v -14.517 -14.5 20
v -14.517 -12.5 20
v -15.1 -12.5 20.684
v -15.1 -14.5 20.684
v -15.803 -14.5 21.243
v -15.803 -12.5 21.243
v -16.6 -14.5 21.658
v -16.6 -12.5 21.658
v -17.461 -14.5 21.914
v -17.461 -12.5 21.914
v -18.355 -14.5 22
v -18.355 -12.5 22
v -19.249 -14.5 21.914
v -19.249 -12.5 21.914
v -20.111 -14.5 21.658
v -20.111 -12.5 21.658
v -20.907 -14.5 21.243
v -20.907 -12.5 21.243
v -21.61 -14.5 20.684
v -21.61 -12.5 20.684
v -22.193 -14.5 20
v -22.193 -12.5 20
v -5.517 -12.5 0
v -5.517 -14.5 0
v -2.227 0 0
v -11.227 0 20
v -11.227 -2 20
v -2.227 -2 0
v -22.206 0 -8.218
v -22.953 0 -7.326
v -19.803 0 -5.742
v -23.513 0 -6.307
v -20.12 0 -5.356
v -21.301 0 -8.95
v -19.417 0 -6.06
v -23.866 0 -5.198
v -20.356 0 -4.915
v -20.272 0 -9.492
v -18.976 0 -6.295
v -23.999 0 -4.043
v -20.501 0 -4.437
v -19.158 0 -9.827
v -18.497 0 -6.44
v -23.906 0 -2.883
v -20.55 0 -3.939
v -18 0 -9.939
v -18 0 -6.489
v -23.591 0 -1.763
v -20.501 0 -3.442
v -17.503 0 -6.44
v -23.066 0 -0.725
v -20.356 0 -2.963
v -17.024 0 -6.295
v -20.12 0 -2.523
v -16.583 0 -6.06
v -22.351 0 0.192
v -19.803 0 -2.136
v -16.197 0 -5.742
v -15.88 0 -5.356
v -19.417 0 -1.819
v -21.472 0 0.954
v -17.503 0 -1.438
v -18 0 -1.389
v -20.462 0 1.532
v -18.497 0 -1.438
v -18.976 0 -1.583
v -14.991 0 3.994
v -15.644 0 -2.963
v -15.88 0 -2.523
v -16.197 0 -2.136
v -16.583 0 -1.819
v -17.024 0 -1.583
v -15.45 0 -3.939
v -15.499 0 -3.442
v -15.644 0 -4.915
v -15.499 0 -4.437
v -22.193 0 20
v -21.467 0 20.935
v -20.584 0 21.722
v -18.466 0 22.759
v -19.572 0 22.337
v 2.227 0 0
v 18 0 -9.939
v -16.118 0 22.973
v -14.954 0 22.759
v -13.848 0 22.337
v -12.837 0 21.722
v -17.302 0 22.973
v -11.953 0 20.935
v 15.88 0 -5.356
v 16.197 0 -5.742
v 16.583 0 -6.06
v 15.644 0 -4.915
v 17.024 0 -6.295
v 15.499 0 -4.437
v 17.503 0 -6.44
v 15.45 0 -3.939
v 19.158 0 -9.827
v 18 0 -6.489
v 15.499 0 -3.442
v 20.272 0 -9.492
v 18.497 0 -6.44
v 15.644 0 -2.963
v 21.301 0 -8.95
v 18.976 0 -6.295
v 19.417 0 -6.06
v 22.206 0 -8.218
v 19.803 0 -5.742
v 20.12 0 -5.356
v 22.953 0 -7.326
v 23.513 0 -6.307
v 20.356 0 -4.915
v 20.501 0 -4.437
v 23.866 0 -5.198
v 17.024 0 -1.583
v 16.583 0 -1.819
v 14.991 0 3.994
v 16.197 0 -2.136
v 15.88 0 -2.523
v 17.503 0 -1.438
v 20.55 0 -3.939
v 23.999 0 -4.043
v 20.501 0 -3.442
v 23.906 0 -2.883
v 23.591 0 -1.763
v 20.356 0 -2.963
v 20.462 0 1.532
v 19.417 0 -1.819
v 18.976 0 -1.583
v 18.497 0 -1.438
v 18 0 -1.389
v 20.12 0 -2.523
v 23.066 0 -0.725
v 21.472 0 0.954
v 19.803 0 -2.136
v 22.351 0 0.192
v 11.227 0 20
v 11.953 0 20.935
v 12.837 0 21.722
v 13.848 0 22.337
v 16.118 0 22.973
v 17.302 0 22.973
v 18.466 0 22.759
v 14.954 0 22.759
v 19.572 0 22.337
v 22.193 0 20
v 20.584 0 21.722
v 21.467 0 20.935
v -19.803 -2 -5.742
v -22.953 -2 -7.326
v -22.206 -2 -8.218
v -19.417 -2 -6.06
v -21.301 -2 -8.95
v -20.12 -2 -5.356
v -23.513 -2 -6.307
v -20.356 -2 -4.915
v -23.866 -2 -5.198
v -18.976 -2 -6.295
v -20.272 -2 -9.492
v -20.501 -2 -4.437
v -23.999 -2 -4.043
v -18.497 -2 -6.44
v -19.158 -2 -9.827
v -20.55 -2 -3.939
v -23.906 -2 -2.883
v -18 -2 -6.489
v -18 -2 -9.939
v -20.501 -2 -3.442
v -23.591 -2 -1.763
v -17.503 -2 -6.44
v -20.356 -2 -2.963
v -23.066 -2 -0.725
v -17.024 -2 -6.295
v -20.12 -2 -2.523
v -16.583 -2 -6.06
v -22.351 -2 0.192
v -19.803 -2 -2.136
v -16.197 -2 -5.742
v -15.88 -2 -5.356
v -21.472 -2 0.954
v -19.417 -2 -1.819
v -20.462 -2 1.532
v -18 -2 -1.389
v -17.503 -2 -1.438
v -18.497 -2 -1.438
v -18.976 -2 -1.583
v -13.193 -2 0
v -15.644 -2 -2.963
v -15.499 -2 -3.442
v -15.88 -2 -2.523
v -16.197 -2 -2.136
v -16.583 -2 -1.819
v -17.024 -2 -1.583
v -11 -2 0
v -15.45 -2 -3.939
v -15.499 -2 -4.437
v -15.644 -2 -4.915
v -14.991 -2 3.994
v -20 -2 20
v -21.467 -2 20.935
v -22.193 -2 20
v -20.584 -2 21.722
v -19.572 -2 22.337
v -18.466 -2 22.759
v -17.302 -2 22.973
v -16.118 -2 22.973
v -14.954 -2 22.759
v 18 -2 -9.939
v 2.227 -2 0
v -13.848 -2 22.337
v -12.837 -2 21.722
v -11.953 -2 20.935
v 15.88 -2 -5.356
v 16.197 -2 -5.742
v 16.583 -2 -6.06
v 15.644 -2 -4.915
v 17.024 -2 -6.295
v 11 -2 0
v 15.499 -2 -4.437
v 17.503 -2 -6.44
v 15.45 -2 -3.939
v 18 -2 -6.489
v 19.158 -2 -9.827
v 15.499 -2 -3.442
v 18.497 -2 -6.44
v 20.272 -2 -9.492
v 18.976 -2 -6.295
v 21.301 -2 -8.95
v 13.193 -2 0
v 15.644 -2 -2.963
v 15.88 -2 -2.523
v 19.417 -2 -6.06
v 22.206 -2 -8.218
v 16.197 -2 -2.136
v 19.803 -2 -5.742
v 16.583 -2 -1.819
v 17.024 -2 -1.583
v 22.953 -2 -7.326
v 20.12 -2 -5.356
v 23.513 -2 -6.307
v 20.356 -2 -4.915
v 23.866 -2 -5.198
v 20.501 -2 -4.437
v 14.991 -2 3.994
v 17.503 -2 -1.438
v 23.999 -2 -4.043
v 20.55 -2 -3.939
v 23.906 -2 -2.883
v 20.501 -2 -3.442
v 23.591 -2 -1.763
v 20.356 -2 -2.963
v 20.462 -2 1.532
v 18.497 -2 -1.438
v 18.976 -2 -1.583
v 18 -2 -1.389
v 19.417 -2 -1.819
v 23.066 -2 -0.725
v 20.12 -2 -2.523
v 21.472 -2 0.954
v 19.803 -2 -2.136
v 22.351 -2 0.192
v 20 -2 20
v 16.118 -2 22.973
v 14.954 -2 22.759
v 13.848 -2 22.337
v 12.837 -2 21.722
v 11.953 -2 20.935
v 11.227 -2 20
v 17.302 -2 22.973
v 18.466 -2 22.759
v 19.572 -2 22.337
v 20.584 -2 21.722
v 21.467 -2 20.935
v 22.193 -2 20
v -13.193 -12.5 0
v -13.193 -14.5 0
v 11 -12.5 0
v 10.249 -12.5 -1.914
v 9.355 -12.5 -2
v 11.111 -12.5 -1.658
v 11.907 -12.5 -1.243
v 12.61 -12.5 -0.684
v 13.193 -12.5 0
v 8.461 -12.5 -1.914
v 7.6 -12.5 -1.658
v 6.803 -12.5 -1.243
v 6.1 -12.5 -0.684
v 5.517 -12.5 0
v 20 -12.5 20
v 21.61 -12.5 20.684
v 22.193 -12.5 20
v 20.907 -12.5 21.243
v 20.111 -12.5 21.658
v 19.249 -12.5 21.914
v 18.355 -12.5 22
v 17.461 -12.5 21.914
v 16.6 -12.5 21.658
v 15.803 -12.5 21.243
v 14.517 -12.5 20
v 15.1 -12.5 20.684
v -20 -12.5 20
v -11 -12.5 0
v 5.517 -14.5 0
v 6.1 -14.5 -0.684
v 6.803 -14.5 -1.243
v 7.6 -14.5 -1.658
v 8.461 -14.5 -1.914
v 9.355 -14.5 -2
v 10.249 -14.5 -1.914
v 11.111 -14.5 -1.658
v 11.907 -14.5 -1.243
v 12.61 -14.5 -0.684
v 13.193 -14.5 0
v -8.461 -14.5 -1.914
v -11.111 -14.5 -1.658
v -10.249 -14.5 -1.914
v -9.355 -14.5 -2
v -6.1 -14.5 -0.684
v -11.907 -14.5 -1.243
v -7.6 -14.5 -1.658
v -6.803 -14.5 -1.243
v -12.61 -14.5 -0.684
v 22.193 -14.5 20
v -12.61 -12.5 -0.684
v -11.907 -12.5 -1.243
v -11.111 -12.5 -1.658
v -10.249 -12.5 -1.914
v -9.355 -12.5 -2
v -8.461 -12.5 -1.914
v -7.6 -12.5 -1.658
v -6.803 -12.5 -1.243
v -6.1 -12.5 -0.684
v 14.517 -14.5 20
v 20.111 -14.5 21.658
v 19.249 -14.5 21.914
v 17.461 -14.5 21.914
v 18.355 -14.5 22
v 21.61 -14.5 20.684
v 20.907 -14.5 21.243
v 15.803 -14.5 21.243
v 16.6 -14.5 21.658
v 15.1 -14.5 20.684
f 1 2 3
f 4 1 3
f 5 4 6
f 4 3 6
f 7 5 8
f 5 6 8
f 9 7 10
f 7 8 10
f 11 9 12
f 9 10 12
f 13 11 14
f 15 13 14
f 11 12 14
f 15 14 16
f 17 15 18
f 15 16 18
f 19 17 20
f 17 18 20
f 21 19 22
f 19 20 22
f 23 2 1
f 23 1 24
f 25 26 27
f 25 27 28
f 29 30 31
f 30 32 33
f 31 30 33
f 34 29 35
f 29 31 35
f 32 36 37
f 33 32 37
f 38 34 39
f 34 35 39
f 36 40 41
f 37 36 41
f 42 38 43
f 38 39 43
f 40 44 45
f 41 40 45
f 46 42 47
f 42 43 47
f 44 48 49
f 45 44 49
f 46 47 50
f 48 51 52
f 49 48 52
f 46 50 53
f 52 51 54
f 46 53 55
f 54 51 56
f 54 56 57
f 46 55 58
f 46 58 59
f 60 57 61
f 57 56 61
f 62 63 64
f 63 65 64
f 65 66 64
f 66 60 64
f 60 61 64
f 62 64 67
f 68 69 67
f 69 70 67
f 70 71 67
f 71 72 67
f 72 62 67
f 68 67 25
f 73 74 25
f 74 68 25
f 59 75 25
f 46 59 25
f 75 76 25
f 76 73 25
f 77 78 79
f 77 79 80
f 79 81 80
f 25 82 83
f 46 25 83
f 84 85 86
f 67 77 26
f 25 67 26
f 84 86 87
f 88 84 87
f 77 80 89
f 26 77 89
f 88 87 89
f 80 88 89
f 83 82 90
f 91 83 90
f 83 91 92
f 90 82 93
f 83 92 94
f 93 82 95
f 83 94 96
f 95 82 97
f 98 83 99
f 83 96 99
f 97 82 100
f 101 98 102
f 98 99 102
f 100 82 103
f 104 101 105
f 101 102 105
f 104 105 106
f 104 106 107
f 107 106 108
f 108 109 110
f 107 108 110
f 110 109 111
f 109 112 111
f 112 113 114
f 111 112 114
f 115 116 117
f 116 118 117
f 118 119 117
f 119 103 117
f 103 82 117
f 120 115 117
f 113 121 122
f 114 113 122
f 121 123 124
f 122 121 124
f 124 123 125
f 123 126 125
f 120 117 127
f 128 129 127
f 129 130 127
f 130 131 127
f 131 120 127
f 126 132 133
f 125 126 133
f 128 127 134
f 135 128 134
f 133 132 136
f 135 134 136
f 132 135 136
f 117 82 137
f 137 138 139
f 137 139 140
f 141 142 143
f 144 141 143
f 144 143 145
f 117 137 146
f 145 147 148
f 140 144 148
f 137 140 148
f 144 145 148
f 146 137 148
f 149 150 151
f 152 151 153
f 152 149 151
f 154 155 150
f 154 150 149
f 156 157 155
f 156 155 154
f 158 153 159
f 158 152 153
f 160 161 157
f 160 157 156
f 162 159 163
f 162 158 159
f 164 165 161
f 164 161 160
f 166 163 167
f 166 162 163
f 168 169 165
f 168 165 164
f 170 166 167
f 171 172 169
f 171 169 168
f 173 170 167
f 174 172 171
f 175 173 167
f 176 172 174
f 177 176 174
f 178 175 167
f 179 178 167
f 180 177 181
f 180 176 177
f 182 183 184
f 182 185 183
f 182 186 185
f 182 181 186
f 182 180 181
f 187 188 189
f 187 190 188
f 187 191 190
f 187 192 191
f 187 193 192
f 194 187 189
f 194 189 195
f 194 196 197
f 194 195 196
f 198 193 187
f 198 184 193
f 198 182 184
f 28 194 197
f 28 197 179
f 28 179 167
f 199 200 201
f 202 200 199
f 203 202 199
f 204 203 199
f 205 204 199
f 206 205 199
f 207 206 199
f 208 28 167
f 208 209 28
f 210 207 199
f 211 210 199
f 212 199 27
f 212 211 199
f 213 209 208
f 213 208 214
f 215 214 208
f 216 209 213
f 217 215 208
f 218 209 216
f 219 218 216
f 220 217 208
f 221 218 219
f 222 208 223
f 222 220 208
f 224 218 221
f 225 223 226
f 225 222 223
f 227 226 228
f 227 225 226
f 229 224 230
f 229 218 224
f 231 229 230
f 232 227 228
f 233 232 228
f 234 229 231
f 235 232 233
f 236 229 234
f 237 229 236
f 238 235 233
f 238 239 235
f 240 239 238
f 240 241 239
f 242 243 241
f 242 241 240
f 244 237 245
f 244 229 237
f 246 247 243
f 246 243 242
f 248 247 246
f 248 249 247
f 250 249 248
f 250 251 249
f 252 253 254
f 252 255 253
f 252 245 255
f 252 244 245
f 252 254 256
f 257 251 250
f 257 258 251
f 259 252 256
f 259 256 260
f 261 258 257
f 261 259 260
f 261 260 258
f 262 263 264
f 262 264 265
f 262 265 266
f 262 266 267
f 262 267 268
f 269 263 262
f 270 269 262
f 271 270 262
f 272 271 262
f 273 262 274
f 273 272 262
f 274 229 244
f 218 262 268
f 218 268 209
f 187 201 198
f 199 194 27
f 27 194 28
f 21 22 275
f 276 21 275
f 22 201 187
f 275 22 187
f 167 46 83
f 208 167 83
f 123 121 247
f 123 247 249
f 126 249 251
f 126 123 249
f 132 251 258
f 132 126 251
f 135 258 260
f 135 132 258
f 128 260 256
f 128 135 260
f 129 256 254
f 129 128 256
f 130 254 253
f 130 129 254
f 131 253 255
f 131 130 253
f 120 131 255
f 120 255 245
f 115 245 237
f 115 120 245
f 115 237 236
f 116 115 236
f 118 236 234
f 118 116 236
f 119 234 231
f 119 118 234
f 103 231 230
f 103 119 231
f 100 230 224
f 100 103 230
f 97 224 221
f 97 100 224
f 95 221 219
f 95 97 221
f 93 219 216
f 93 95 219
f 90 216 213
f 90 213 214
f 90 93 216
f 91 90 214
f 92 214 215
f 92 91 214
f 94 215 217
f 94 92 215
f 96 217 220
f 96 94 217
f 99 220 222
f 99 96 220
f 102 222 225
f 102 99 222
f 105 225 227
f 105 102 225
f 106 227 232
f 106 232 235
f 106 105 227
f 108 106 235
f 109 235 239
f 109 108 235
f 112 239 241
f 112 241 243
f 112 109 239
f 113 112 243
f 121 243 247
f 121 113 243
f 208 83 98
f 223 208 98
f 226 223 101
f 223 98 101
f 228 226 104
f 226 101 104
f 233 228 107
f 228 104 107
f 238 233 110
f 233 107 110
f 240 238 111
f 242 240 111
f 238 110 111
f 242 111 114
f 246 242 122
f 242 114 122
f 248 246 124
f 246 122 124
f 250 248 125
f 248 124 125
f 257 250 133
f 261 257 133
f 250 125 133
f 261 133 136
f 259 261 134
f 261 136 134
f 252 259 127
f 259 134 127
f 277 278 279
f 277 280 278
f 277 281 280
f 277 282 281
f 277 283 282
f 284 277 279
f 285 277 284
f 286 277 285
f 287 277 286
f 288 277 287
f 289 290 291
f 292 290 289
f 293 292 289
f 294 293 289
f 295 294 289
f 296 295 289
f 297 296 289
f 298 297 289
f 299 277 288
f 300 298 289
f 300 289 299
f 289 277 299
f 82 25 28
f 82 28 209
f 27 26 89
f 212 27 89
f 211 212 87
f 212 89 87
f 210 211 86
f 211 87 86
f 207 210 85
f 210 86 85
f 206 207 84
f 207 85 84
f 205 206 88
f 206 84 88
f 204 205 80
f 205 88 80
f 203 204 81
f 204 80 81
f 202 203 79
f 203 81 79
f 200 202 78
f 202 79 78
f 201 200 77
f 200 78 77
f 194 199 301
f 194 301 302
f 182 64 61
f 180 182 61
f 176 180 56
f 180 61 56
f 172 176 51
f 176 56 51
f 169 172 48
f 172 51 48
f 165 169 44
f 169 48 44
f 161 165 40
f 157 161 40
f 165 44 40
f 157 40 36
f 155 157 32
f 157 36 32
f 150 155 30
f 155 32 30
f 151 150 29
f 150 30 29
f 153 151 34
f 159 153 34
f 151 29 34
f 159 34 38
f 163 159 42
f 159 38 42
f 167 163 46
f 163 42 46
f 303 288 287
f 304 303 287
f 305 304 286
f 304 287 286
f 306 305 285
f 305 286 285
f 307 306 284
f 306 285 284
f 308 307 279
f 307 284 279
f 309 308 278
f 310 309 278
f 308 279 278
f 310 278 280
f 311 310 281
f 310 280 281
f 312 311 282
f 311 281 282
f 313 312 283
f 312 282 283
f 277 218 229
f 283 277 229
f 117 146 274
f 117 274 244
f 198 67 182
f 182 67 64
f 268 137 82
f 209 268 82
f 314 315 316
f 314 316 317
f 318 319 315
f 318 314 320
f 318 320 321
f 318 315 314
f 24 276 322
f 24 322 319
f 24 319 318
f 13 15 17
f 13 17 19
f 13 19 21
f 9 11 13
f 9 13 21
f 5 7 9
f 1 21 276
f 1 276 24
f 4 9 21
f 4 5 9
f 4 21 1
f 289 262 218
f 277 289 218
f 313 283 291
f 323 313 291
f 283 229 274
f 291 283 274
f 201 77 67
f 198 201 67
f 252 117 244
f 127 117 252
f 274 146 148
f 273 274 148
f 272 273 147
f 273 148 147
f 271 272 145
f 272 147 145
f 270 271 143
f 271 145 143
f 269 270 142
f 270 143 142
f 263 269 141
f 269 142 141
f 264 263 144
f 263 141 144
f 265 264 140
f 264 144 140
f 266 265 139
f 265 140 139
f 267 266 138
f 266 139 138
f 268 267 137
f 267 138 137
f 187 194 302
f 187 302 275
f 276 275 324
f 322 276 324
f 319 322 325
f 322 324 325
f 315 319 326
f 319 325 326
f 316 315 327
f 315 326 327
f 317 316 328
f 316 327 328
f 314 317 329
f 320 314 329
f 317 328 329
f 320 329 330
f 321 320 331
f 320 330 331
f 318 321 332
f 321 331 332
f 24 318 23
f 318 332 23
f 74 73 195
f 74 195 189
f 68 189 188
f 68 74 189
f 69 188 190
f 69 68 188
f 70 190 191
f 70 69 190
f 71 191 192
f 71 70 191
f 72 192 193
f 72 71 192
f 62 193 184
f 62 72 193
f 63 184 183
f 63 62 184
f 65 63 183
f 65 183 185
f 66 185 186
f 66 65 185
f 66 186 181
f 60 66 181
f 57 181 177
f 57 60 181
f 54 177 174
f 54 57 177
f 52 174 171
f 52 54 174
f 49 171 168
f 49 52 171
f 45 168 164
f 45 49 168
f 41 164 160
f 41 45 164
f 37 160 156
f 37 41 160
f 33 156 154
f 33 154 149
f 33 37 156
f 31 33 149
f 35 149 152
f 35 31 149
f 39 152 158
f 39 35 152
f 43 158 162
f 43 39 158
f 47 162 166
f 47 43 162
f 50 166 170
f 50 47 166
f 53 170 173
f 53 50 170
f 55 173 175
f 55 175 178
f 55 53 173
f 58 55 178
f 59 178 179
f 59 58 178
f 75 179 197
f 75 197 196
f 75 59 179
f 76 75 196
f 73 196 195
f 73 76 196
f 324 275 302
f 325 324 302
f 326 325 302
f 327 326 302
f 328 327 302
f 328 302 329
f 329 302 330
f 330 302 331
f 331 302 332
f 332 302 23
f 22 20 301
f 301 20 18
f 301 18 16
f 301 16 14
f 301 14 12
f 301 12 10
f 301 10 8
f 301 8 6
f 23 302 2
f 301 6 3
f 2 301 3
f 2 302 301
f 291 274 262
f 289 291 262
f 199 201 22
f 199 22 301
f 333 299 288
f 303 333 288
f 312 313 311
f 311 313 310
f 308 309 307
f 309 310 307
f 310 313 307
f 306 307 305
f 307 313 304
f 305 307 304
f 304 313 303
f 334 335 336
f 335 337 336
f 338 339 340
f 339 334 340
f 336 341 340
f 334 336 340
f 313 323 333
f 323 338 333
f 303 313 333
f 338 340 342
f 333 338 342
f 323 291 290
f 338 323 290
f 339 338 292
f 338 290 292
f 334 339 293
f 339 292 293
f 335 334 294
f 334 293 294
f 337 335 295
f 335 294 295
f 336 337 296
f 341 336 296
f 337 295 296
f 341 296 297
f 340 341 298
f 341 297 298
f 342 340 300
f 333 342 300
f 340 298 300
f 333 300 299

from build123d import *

# Parameters (mm, degrees)
SKETCH_R     = 2.55
PAD_DEPTH    = 2
PAD001_DEPTH = 10.5
PAD002_DEPTH = 2


with BuildPart() as part:
    # Sketch → Pad (new body)
    with BuildSketch(Plane.XZ):
        with BuildLine():
            Line((-22.193171, 20), (-14.990659, 3.994417))
            Line((-14.990659, 3.994417), (-20.462188, 1.532229))
            ThreePointArc((-20.462188, 1.532229), (-23.866395, -5.198432), (-18, -9.9393))
            Line((-18, -9.9393), (18, -9.9393))
            ThreePointArc((18, -9.9393), (23.866395, -5.198432), (20.462188, 1.532229))
            Line((14.990659, 3.994417), (20.462188, 1.532229))
            Line((22.193171, 20), (14.990659, 3.994417))
            ThreePointArc((22.193171, 20), (16.710243, 23), (11.227315, 20))
            Line((11.227315, 20), (2.227315, 0))
            Line((-2.227315, 0), (2.227315, 0))
            Line((-11.227315, 20), (-2.227315, 0))
            ThreePointArc((-11.227315, 20), (-16.710243, 23), (-22.193171, 20))
        make_face()
        with Locations((-18, -3.9393)):
            Circle(SKETCH_R, mode=Mode.SUBTRACT)
        with Locations((18, -3.9393)):
            Circle(SKETCH_R, mode=Mode.SUBTRACT)
    extrude(amount=PAD_DEPTH)

    # Sketch001 (on Face16 of Pad) → Pad001 (join)
    with BuildSketch(Plane.XZ.offset(2)):
        Polygon((-20, 20), (-11, 0), (-13.193171, 0), (-22.193171, 20), align=None)
        Polygon((20, 20), (11, 0), (13.193171, 0), (22.193171, 20), align=None)
    extrude(amount=PAD001_DEPTH)

    # Sketch002 (on Face25 of Pad001) → Pad002 (join)
    with BuildSketch(Plane.XZ.offset(12.5)):
        with BuildLine():
            Line((-22.193171, 20), (-13.193171, 0))
            ThreePointArc((-13.193171, 0), (-9.355122, -2), (-5.517072, 0))
            Line((-14.517072, 20), (-5.517072, 0))
            ThreePointArc((-14.517072, 20), (-18.355122, 22), (-22.193171, 20))
        make_face()
        with BuildLine():
            Line((22.193171, 20), (13.193171, 0))
            ThreePointArc((5.517072, 0), (9.355122, -2), (13.193171, 0))
            Line((14.517072, 20), (5.517072, 0))
            ThreePointArc((22.193171, 20), (18.355122, 22), (14.517072, 20))
        make_face()
    extrude(amount=PAD002_DEPTH)


solid = part.part
